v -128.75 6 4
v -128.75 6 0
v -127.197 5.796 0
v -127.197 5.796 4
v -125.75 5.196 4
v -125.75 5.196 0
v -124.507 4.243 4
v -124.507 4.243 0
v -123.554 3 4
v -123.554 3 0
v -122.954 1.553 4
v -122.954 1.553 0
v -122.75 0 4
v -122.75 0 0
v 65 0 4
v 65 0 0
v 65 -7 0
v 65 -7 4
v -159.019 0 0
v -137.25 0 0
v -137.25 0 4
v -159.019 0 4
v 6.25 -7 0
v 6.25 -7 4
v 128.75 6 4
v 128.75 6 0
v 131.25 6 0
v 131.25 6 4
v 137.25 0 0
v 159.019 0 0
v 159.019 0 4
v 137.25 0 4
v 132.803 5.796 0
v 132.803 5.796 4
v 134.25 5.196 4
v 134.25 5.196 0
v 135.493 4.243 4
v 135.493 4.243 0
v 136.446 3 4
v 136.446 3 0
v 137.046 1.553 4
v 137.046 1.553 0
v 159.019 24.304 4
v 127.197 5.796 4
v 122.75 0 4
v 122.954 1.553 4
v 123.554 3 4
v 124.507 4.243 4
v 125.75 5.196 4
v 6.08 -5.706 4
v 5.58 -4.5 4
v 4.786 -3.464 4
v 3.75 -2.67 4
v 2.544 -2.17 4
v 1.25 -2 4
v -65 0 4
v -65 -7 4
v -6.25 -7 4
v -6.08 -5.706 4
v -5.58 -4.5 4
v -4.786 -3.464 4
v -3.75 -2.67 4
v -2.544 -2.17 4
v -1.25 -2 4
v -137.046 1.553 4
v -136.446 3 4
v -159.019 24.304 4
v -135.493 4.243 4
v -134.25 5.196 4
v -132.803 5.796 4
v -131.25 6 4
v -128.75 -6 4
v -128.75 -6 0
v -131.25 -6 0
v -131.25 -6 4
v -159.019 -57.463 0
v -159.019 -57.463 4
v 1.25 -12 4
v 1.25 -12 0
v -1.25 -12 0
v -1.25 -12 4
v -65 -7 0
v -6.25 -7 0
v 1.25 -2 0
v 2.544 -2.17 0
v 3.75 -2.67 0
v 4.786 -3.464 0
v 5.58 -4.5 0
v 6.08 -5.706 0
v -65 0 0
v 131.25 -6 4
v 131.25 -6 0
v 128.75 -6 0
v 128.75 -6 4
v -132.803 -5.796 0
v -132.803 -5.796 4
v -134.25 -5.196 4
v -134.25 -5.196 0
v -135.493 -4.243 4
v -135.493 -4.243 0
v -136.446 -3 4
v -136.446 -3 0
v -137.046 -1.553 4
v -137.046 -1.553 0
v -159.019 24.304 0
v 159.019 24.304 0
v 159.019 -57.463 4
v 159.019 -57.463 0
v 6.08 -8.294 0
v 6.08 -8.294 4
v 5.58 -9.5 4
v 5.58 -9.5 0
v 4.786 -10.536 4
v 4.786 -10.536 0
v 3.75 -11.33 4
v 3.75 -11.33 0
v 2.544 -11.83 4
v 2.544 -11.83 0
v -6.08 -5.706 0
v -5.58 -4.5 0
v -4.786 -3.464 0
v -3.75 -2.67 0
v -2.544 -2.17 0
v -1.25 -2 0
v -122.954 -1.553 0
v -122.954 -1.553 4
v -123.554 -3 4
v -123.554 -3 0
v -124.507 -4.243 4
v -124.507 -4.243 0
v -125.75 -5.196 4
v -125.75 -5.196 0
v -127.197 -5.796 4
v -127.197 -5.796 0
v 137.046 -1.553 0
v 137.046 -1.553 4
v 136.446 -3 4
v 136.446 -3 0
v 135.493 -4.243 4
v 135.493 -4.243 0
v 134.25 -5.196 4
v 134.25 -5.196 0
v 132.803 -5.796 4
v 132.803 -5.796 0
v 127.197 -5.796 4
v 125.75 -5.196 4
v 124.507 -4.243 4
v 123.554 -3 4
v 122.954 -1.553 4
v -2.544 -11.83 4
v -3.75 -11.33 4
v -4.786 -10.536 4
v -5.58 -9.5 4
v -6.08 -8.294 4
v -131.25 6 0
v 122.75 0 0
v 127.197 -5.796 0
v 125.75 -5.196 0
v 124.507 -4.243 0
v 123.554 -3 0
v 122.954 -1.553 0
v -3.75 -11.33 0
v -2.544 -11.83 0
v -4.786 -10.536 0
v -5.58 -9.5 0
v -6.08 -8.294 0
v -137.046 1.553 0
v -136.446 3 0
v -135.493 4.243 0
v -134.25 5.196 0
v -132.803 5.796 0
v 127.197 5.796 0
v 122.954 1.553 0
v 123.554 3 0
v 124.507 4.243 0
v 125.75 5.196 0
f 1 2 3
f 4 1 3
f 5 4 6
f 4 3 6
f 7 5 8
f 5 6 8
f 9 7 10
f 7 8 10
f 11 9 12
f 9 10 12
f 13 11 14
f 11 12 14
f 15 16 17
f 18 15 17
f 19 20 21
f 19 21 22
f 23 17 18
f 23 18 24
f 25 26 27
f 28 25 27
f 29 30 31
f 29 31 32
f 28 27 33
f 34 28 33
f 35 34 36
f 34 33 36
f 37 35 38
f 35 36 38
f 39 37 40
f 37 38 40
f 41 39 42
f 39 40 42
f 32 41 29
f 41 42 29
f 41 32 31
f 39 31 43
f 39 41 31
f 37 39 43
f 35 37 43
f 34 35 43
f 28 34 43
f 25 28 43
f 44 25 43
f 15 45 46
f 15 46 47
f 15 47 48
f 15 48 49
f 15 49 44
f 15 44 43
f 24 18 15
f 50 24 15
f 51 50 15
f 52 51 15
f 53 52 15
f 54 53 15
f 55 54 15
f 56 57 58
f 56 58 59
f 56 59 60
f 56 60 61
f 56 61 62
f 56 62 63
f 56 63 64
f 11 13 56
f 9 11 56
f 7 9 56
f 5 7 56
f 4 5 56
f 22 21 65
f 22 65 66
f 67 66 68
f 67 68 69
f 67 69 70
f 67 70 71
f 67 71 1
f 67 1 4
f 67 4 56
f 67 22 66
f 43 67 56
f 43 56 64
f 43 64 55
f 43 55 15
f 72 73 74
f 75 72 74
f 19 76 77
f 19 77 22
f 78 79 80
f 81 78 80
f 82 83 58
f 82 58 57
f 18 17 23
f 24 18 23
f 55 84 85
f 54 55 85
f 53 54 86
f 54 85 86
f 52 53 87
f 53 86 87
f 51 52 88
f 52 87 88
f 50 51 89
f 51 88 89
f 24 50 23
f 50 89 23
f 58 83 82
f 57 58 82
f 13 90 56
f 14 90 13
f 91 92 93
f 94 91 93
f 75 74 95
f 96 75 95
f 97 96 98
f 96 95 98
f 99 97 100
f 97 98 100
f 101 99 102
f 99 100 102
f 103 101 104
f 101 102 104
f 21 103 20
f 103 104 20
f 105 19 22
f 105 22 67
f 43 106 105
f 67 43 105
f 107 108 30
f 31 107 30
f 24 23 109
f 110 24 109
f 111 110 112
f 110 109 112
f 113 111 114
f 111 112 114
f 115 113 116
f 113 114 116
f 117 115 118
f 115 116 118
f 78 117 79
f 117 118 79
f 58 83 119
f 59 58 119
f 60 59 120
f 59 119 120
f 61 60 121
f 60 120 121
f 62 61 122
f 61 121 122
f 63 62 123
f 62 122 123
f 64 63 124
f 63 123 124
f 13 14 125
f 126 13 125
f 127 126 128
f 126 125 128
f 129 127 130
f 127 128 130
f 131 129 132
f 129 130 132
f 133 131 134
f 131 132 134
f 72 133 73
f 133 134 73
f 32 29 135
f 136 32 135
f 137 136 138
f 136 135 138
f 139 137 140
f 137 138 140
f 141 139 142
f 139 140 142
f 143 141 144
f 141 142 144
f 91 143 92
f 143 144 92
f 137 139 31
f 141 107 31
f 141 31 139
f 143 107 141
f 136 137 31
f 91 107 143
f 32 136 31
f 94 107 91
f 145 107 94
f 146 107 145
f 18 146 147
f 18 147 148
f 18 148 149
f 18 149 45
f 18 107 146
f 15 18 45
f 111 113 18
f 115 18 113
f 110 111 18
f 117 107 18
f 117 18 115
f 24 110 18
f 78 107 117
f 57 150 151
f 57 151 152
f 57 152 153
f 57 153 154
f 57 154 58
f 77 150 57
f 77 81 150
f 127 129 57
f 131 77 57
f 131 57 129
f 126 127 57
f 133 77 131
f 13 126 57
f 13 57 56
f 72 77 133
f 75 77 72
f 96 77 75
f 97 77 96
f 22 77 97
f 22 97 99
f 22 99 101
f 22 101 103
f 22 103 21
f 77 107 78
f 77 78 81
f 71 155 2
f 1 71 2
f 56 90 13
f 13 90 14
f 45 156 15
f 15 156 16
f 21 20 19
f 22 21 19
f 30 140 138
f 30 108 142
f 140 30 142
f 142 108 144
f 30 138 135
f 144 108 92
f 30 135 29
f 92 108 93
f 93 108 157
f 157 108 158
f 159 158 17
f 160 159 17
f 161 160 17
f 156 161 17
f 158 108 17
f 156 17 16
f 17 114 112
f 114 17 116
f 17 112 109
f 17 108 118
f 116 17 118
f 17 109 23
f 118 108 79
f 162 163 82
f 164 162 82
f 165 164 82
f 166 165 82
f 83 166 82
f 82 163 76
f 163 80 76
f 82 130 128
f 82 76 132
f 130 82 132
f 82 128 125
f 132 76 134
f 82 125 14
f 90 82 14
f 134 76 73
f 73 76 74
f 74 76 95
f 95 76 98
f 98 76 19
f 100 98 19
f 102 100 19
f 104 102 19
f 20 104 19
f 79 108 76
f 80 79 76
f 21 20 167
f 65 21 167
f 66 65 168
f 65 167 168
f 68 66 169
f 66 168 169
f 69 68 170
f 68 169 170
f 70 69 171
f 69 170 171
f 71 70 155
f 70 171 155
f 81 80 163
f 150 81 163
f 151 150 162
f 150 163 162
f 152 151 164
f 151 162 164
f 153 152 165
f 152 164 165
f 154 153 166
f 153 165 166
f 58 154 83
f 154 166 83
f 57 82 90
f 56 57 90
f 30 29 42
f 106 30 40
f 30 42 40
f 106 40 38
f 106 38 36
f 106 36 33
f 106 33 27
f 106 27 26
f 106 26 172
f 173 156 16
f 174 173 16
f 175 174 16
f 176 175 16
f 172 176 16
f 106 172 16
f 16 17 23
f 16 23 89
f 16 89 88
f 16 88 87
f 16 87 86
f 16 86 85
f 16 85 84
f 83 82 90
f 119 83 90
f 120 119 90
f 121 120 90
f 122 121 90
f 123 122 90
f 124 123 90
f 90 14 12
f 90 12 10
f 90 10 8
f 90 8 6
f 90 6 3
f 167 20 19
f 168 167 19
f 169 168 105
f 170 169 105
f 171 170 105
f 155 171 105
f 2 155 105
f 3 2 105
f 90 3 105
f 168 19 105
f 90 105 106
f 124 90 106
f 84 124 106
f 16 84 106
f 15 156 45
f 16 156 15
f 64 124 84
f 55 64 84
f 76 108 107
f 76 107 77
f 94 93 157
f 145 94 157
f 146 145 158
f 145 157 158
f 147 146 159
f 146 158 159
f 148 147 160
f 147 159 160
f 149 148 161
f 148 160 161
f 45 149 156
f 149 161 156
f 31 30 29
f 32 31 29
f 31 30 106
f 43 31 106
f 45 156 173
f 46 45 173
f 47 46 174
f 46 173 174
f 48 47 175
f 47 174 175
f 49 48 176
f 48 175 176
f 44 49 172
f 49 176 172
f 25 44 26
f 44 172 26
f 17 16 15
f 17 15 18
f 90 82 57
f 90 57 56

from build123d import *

# Parameters (mm, degrees)
SKETCH1_W                = 81.76788233
SKETCH1_H                = 318.0385329
BOSS_EXTRUDE1_DEPTH      = 4
SPLIT1_SURFACE_1_1_BACK  = 329.406
SPLIT1_SURFACE_1_1_DEPTH = 658.812
SPLIT1_SURFACE_1_2_BACK  = 329.406
SPLIT1_SURFACE_1_2_DEPTH = 658.812


with BuildPart() as part:
    # Sketch1 → Boss-Extrude1 (new body)
    with BuildSketch(Plane(origin=(0, 0, 0), x_dir=(0, 1, 0), z_dir=(0, 0, 1))):
        with Locations((-16.57951628, 0)):
            Rectangle(SKETCH1_W, SKETCH1_H)
        with BuildLine():
            Line((-6, 128.75), (-6, 131.25))
            ThreePointArc((-6, 131.25), (0, 137.25), (6, 131.25))
            Line((6, 131.25), (6, 128.75))
            ThreePointArc((6, 128.75), (0, 122.75), (-6, 128.75))
        make_face(mode=Mode.SUBTRACT)
        with BuildLine():
            Line((-6, -131.25), (-6, -128.75))
            ThreePointArc((-6, -128.75), (0, -122.75), (6, -128.75))
            Line((6, -128.75), (6, -131.25))
            ThreePointArc((6, -131.25), (0, -137.25), (-6, -131.25))
        make_face(mode=Mode.SUBTRACT)
        with BuildLine():
            Line((-2, 1.25), (-2, -1.25))
            ThreePointArc((-2, -1.25), (-7, -6.25), (-12, -1.25))
            Line((-12, -1.25), (-12, 1.25))
            ThreePointArc((-12, 1.25), (-7, 6.25), (-2, 1.25))
        make_face(mode=Mode.SUBTRACT)
    extrude(amount=BOSS_EXTRUDE1_DEPTH)


with BuildPart() as body_2:
    # Split1: the piece behind the surface
    add(part.part)
    # Split1 surface 1: a surface, the sketch's curves swept straight by 658.812 mm
    with BuildLine(Plane.XY.offset(4).offset(-SPLIT1_SURFACE_1_1_BACK), mode=Mode.PRIVATE) as split1_surface_1_1_path:
        Line((159.01926645, 0), (65, 0))
        Line((65, 0), (65, -7))
        Line((65, -7), (-65, -7))
        Line((-65, -7), (-65, 0))
        Line((-65, 0), (-159.01926645, 0))
    split1_surface_1_1 = Shell.extrude(split1_surface_1_1_path.wire(), (0 * SPLIT1_SURFACE_1_1_DEPTH, 0 * SPLIT1_SURFACE_1_1_DEPTH, 1 * SPLIT1_SURFACE_1_1_DEPTH))
    split(bisect_by=split1_surface_1_1, keep=Keep.BOTTOM)


with BuildPart() as part_1:
    add(part.part)

    # Split1: split by a surface, the side it looks to stays
    # Split1 surface 1: a surface, the sketch's curves swept straight by 658.812 mm
    with BuildLine(Plane.XY.offset(4).offset(-SPLIT1_SURFACE_1_2_BACK), mode=Mode.PRIVATE) as split1_surface_1_2_path:
        Line((159.01926645, 0), (65, 0))
        Line((65, 0), (65, -7))
        Line((65, -7), (-65, -7))
        Line((-65, -7), (-65, 0))
        Line((-65, 0), (-159.01926645, 0))
    split1_surface_1_2 = Shell.extrude(split1_surface_1_2_path.wire(), (0 * SPLIT1_SURFACE_1_2_DEPTH, 0 * SPLIT1_SURFACE_1_2_DEPTH, 1 * SPLIT1_SURFACE_1_2_DEPTH))
    split(bisect_by=split1_surface_1_2, keep=Keep.TOP)


solid = Compound([body_2.part, part_1.part])
